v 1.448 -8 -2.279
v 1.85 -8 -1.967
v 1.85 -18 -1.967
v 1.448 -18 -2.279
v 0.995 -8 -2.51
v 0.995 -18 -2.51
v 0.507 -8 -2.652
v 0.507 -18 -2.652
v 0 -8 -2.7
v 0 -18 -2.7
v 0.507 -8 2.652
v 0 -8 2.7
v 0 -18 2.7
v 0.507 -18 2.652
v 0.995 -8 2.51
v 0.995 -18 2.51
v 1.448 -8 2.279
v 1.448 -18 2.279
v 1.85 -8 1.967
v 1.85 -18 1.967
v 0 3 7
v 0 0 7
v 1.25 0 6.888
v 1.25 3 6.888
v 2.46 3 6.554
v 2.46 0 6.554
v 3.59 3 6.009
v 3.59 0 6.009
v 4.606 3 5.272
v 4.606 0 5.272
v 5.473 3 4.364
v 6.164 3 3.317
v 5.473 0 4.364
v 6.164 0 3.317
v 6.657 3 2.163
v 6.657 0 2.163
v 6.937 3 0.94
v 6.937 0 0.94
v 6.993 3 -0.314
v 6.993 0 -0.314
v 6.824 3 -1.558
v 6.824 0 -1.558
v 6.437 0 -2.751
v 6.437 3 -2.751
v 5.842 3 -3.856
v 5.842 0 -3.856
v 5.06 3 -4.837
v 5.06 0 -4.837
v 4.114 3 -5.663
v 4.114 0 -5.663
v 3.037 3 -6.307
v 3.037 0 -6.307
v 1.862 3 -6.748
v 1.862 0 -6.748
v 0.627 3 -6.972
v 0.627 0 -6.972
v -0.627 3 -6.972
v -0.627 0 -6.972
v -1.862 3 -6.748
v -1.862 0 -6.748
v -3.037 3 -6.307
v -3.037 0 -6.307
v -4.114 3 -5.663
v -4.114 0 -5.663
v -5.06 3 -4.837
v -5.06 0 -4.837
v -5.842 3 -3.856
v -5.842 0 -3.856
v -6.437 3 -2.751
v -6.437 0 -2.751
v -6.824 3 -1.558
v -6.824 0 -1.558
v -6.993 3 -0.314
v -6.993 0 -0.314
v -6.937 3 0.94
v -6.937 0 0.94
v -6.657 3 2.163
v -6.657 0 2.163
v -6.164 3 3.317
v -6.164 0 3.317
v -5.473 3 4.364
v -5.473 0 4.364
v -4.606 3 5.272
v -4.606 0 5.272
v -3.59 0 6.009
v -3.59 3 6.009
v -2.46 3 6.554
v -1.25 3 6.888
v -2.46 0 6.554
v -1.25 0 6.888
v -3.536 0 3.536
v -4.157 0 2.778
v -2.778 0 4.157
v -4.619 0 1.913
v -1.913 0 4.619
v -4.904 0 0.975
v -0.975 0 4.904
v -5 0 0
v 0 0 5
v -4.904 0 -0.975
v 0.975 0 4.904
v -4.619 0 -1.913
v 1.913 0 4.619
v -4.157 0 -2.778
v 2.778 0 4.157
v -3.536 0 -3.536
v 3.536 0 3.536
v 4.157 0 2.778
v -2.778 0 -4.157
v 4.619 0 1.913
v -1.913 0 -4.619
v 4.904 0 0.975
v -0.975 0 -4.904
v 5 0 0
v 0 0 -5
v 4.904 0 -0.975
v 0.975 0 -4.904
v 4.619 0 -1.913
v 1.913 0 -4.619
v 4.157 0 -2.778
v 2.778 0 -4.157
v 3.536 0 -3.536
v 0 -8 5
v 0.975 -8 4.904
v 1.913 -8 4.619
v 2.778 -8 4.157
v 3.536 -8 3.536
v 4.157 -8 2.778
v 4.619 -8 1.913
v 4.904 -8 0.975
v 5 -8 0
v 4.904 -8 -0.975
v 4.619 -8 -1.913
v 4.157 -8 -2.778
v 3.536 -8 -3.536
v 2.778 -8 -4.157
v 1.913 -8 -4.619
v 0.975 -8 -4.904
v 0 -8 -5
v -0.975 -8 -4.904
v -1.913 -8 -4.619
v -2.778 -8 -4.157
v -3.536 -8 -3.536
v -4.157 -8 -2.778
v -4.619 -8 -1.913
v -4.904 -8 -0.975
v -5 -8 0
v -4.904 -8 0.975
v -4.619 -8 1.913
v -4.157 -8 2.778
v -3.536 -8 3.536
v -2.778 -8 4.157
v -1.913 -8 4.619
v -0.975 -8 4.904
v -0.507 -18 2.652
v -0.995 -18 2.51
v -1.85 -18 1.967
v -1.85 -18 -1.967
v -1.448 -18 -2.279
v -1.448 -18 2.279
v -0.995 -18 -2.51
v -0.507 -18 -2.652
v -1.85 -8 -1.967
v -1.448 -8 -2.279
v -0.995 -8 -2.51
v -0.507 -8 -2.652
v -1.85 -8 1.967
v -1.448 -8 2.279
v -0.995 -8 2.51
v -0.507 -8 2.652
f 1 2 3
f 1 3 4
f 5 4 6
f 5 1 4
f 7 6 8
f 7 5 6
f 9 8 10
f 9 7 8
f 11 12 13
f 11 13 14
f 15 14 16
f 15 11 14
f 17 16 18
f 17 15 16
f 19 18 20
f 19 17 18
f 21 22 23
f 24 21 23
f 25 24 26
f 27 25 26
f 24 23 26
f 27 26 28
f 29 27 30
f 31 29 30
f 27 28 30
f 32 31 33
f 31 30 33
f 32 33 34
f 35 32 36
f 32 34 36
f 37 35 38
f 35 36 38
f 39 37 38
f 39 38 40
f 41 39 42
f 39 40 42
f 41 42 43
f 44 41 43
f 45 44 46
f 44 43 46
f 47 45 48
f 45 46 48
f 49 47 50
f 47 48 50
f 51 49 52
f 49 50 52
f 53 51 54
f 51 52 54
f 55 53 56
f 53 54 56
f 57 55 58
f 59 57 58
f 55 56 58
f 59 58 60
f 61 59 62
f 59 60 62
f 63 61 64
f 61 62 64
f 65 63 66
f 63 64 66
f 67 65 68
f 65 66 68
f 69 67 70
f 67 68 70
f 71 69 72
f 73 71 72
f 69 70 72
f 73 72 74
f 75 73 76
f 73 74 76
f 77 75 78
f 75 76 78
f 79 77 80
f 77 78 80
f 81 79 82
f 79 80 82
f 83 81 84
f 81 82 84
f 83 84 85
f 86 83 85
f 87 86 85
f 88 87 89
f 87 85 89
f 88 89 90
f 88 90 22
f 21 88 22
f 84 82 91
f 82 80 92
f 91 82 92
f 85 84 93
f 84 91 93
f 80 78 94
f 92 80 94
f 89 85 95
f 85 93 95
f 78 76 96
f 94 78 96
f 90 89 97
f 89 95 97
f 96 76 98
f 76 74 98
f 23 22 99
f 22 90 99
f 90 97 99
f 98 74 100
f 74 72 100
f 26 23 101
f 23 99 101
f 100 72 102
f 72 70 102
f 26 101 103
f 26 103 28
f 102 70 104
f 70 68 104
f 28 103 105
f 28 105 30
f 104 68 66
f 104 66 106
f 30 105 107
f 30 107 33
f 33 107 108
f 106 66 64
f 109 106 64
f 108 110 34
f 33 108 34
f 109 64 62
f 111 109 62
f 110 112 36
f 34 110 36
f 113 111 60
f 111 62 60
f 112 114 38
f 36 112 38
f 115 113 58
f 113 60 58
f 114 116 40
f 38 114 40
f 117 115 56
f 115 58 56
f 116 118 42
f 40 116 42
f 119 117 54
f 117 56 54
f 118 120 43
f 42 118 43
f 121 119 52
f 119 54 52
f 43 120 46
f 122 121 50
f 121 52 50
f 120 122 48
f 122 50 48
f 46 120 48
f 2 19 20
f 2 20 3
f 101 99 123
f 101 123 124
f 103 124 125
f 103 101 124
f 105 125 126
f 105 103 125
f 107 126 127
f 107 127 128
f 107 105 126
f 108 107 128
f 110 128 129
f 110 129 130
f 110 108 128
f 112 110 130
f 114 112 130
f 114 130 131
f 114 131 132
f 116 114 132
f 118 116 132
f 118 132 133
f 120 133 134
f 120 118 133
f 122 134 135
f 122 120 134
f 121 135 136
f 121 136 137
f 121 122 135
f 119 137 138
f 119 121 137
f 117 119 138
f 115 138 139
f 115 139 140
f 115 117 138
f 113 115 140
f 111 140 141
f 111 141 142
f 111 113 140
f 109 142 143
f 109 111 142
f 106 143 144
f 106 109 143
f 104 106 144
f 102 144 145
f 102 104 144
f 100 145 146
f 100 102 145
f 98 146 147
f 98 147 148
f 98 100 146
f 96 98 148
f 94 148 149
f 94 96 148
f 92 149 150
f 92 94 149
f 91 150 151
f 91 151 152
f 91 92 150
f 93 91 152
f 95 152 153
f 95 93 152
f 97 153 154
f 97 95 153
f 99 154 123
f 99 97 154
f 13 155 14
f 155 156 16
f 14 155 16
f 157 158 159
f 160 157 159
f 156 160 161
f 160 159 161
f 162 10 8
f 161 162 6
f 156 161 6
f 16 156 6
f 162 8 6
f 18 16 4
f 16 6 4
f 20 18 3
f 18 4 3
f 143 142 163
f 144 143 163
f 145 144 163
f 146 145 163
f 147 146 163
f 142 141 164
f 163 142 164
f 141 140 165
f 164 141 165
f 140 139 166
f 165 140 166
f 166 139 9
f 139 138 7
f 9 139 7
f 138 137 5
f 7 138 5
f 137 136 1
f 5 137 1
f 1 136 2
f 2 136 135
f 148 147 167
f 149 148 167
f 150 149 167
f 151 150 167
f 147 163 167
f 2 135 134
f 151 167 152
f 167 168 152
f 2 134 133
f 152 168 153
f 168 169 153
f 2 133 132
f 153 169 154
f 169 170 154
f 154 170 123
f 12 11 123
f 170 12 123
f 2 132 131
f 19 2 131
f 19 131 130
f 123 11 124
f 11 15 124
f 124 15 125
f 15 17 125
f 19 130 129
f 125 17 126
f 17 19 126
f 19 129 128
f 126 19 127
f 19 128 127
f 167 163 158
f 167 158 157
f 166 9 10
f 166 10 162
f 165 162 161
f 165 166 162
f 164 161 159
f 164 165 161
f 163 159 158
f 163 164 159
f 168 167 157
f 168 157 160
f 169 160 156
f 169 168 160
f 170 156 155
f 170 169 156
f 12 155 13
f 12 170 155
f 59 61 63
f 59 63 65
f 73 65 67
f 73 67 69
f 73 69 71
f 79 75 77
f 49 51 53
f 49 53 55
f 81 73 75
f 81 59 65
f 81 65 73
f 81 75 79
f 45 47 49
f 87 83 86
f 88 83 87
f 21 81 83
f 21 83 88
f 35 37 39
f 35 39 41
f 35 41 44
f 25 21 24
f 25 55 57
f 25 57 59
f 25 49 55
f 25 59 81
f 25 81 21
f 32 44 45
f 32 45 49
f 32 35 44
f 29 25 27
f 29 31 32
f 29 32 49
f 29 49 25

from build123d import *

# Parameters (mm, degrees)
SKETCH1_R           = 7
SKETCH1_R_2         = 5
BOSS_EXTRUDE1_DEPTH = 3
SKETCH1_3_R         = 5
BOSS_EXTRUDE2_DEPTH = 8
BOSS_EXTRUDE3_START = -8
BOSS_EXTRUDE3_DEPTH = 10


with BuildPart() as part:
    # Sketch1 → Boss-Extrude1 (new body)
    # profile 1 of 4: a face of its own
    with BuildSketch(Plane(origin=(0, 0, 0), x_dir=(1, 0, 0), z_dir=(0, 1, 0))):
        with Locations(Location((0, 0, 0), (0, 0, 270))):
            Circle(SKETCH1_R)
        Circle(SKETCH1_R_2, mode=Mode.SUBTRACT)
    # profile 2 of 4: a face of its own
    with BuildSketch(Plane(origin=(0, 0, 0), x_dir=(1, 0, 0), z_dir=(0, 1, 0))):
        Circle(SKETCH1_R_2)
        with BuildLine():
            ThreePointArc((-1.85, -1.966596044), (0, -2.7), (1.85, -1.966596044))
            Line((1.85, -1.966596044), (1.85, 1.966596044))
            ThreePointArc((1.85, 1.966596044), (0, 2.7), (-1.85, 1.966596044))
            Line((-1.85, 1.966596044), (-1.85, -1.966596044))
        make_face(mode=Mode.SUBTRACT)
    # profile 3 of 4: a face of its own
    with BuildSketch(Plane(origin=(0, 0, 0), x_dir=(1, 0, 0), z_dir=(0, 1, 0))):
        with BuildLine():
            Line((1.85, -1.966596044), (1.85, 1.966596044))
            ThreePointArc((1.85, 1.966596044), (0.995035346, 2.509961087), (0, 2.7))
            Line((0, 2.7), (0, -2.7))
            ThreePointArc((0, -2.7), (0.995035346, -2.509961087), (1.85, -1.966596044))
        make_face()
    # profile 4 of 4: a face of its own
    with BuildSketch(Plane(origin=(0, 0, 0), x_dir=(1, 0, 0), z_dir=(0, 1, 0))):
        with BuildLine():
            Line((0, -2.7), (0, 2.7))
            ThreePointArc((0, 2.7), (-0.995035346, 2.509961087), (-1.85, 1.966596044))
            Line((-1.85, 1.966596044), (-1.85, -1.966596044))
            ThreePointArc((-1.85, -1.966596044), (-0.995035346, -2.509961087), (0, -2.7))
        make_face()
    extrude(amount=BOSS_EXTRUDE1_DEPTH)

    # Sketch1<3> → Boss-Extrude2 (add)
    with BuildSketch(Plane(origin=(0, 0, 0), x_dir=(1, 0, 0), z_dir=(0, 1, 0))):
        with Locations(Location((0, 0, 0), (0, 0, 270))):
            Circle(SKETCH1_3_R)
    extrude(amount=-BOSS_EXTRUDE2_DEPTH)

    # Sketch1<5> → Boss-Extrude3 (add)
    with BuildSketch(Plane(origin=(0, 0, 0), x_dir=(1, 0, 0), z_dir=(0, 1, 0)).offset(BOSS_EXTRUDE3_START)):
        with BuildLine():
            Line((0, -2.7), (0, 2.7))
            ThreePointArc((0, 2.7), (-0.995035346, 2.509961087), (-1.85, 1.966596044))
            Line((-1.85, 1.966596044), (-1.85, -1.966596044))
            ThreePointArc((-1.85, -1.966596044), (-0.995035346, -2.509961087), (0, -2.7))
        make_face()
        with BuildLine():
            Line((1.85, -1.966596044), (1.85, 1.966596044))
            ThreePointArc((1.85, 1.966596044), (0.995035346, 2.509961087), (0, 2.7))
            Line((0, 2.7), (0, -2.7))
            ThreePointArc((0, -2.7), (0.995035346, -2.509961087), (1.85, -1.966596044))
        make_face()
    extrude(amount=-BOSS_EXTRUDE3_DEPTH)


solid = part.part
